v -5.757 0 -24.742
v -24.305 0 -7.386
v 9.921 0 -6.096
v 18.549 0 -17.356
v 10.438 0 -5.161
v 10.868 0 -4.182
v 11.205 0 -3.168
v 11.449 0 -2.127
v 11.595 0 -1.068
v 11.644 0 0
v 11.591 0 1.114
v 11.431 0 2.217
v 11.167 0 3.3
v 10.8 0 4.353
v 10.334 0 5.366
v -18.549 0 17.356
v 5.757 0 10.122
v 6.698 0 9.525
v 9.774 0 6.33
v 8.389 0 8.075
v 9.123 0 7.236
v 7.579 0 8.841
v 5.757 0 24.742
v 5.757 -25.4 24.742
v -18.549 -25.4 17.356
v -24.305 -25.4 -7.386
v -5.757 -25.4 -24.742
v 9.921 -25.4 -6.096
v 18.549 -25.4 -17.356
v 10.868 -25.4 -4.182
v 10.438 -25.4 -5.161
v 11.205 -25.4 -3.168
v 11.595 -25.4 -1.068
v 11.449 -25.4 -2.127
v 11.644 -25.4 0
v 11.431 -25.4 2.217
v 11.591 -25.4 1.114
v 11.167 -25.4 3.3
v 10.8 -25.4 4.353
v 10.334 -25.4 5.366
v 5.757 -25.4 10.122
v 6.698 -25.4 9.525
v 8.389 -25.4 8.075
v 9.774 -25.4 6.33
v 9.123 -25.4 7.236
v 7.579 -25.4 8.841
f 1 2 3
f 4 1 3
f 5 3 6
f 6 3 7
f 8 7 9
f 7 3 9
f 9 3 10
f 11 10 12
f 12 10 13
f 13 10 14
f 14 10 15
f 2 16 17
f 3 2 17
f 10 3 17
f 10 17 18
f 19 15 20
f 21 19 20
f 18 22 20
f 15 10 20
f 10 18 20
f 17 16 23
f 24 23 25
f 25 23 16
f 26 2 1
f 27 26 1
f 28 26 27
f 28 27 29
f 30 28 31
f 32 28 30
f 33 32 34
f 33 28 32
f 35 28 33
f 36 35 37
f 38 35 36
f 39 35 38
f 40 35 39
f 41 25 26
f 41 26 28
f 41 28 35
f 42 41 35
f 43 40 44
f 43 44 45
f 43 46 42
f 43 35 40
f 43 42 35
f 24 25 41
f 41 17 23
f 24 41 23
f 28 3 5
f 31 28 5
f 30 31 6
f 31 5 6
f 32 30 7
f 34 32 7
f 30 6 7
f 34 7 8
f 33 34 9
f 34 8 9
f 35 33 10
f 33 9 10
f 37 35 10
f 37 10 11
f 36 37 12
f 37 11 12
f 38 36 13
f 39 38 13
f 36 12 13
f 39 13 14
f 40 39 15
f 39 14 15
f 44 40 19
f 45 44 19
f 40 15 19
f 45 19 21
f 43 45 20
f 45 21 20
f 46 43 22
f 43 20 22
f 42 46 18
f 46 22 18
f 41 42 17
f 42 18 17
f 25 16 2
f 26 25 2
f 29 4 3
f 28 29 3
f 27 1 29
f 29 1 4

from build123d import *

# Parameters (mm, degrees)
F1_DEPTH = 25.4


with BuildPart() as f1:
    # F0 (on Front) → F1 (new body)
    with BuildSketch(Plane.XZ):
        with BuildLine():
            Line((5.7565809201, 24.7419614515), (-18.5488766964, 17.3563260415))
            Line((-18.5488766964, 17.3563260415), (-24.3054576165, -7.38563541))
            Line((-24.3054576165, -7.38563541), (-5.7565809201, -24.7419614515))
            Line((-5.7565809201, -24.7419614515), (18.5488766964, -17.3563260415))
            Line((18.5488766964, -17.3563260415), (9.9212024357, -6.0961798708))
            ThreePointArc((9.9212024357, -6.0961798708), (-11.27855426, -2.8961837982), (5.7565809201, 10.1220276081))
            Line((5.7565809201, 10.1220276081), (5.7565809201, 24.7419614515))
        make_face()
        with BuildLine():
            ThreePointArc((11.6444693648, 0), (10.0654358316, 5.8549695395), (5.7565809201, 10.1220276081))
            Line((5.7565809201, 10.1220276081), (5.7565809201, -0.6608509982))
            Line((5.7565809201, -0.6608509982), (9.9212024357, -6.0961798708))
            ThreePointArc((9.9212024357, -6.0961798708), (11.2053738138, -3.1675328698), (11.6444693648, 0))
        make_face()
        with BuildLine():
            Line((5.7565809201, -0.6608509982), (5.7565809201, 10.1220276081))
            ThreePointArc((5.7565809201, 10.1220276081), (-11.27855426, -2.8961837982), (9.9212024357, -6.0961798708))
            Line((9.9212024357, -6.0961798708), (5.7565809201, -0.6608509982))
        make_face()
    extrude(amount=F1_DEPTH)


solid = f1.part
